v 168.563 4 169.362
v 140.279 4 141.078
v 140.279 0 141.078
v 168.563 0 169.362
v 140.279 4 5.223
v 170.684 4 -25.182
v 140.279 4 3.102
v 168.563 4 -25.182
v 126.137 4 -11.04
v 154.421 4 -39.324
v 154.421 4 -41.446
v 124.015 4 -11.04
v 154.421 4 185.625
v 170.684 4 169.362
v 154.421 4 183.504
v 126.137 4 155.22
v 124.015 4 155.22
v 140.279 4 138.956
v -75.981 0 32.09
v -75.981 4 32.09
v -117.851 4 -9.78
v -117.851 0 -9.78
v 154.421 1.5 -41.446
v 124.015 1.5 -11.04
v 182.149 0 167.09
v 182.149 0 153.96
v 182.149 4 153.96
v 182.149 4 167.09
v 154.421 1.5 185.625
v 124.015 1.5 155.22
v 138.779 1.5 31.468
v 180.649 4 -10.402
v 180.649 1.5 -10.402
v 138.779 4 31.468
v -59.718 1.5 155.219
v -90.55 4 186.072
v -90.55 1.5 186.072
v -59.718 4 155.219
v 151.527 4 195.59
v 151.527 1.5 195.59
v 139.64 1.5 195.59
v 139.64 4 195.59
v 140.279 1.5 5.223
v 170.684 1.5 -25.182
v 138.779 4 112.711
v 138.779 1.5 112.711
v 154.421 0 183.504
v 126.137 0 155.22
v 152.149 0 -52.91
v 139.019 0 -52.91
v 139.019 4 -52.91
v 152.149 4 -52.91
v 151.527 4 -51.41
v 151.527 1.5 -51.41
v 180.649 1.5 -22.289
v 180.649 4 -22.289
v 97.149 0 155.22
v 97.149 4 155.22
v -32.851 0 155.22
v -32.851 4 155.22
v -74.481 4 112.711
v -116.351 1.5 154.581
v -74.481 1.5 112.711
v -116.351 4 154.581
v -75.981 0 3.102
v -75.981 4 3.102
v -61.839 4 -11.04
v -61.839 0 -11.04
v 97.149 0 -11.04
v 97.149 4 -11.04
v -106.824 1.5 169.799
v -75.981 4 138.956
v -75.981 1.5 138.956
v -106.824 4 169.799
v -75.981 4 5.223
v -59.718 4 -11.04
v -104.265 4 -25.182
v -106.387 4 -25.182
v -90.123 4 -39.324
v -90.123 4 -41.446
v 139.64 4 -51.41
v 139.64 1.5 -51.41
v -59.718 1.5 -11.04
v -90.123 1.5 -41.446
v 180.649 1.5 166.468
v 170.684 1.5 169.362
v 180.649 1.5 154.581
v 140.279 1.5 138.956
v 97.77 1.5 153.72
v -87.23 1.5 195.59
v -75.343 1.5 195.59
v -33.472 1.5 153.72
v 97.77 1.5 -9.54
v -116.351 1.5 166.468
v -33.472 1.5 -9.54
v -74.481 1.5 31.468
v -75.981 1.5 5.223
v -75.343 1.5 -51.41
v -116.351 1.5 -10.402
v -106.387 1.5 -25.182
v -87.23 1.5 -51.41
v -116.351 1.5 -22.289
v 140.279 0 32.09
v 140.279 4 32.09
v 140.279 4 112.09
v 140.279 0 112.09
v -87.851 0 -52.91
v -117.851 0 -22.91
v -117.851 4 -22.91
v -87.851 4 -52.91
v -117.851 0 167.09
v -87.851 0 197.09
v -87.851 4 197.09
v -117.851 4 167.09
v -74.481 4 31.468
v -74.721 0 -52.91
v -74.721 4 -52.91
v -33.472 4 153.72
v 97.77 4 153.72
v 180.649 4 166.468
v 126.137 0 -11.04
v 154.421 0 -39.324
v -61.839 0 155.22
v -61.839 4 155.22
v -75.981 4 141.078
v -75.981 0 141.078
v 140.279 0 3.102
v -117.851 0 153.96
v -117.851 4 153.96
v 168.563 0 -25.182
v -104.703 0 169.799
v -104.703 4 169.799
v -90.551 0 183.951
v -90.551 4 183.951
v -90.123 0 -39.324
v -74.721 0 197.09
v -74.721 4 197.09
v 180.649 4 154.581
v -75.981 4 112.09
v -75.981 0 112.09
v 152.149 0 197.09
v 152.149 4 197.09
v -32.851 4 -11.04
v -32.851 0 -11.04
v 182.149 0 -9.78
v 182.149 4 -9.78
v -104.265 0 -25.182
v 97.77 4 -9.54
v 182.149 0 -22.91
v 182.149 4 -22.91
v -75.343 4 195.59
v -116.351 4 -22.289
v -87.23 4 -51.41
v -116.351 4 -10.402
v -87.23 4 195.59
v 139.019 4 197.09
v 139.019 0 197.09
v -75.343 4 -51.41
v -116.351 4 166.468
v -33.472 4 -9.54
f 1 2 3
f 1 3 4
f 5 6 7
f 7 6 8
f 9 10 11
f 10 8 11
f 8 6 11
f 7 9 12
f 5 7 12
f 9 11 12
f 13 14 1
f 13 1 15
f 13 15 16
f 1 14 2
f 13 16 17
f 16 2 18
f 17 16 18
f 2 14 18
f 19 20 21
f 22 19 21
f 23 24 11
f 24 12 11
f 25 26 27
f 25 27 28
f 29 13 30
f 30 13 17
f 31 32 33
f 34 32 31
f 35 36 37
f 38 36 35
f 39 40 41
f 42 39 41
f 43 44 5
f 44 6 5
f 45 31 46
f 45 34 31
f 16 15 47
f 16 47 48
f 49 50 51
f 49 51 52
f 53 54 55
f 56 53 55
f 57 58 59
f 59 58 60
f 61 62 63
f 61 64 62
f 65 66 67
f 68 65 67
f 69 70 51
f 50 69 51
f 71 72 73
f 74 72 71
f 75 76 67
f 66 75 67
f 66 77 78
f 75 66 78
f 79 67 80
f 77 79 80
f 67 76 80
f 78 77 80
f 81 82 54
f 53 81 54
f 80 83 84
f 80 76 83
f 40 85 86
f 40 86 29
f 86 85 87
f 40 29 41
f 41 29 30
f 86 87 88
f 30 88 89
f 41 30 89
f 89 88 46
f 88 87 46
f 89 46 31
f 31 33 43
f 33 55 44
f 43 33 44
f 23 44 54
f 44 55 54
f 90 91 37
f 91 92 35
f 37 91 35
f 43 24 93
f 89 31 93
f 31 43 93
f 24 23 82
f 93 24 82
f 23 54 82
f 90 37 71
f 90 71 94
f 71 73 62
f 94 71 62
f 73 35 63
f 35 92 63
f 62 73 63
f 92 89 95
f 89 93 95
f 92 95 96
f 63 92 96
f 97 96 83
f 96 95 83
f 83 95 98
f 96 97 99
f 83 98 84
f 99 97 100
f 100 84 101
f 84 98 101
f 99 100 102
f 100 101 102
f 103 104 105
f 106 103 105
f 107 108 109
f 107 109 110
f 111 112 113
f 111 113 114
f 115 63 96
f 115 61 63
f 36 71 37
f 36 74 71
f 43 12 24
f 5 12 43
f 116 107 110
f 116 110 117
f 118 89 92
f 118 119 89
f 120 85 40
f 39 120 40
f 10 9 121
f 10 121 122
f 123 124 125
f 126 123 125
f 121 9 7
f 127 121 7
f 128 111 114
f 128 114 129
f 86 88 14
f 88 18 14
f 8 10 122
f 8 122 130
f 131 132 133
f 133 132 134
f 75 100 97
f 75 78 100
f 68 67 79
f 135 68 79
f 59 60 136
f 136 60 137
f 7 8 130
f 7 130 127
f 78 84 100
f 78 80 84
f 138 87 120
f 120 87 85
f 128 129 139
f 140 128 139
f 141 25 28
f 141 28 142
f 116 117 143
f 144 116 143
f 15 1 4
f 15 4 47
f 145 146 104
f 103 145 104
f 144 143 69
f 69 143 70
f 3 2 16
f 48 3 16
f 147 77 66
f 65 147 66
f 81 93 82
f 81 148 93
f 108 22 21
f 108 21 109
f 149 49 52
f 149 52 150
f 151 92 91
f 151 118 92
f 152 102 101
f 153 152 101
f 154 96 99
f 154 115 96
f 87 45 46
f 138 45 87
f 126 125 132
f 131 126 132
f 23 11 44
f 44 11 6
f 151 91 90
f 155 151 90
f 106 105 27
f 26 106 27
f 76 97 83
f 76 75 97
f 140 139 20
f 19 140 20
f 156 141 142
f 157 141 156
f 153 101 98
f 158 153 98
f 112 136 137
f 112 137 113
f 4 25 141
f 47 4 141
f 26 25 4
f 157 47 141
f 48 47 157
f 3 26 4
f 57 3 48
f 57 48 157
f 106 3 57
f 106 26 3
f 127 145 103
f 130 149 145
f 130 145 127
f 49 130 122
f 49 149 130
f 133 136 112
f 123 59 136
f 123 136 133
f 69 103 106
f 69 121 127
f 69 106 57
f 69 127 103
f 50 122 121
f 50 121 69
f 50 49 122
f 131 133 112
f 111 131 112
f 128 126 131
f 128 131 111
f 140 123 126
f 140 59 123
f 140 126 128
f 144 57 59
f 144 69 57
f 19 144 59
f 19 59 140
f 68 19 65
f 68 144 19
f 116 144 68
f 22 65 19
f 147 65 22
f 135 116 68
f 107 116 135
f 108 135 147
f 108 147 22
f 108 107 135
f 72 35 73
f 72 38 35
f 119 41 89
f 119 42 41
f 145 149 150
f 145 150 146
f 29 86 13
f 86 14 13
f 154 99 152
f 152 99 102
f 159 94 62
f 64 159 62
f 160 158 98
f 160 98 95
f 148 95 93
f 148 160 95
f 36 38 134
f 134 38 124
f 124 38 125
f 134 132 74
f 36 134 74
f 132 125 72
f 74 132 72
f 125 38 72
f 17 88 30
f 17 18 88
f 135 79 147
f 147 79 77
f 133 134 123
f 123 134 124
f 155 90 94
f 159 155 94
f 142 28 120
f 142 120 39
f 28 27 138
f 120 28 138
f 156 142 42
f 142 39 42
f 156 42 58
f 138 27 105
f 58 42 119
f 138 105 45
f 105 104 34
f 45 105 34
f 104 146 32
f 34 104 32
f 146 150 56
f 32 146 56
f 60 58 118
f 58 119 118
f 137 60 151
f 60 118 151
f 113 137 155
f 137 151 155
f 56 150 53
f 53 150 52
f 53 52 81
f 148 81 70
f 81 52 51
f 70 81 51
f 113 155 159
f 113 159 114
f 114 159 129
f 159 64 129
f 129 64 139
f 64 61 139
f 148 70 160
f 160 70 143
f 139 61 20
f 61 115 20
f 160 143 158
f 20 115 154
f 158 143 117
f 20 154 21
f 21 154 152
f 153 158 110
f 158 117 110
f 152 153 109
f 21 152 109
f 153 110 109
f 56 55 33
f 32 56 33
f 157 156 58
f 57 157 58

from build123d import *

# Parameters (mm, degrees)
BOSS_EXTRUDE1_DEPTH = 4
CUT_EXTRUDE1_DEPTH  = 5
CUT_EXTRUDE3_DEPTH  = 5
CUT_EXTRUDE4_DEPTH  = 5
CUT_EXTRUDE5_DEPTH  = 5
SHELL1_T            = -1.5


with BuildPart() as part:
    # Sketch1 → Boss-Extrude1 (new body)
    with BuildSketch(Plane(origin=(0, 0, 0), x_dir=(1, 0, 0), z_dir=(0, 1, 0))):
        Polygon((-87.851196474, 52.910261526), (152.148803526, 52.910261526), (182.148803526, 22.910261526), (182.148803526, -167.089738474), (152.148803526, -197.089738474), (-87.851196474, -197.089738474), (-117.851196474, -167.089738474), (-117.851196474, 22.910261526), align=None)
    extrude(amount=BOSS_EXTRUDE1_DEPTH)

    # Sketch2 → Cut-Extrude1 (cut)
    with BuildSketch(Plane(origin=(0, 4, 0), x_dir=(1, 0, 0), z_dir=(0, 1, 0))):
        Polygon((-75.981138789, -72.089738474), (-75.981138789, -32.089738474), (-117.851196474, 9.780319211), (-117.851196474, -153.959796159), (-75.981138789, -112.089738474), align=None)
    extrude(amount=-CUT_EXTRUDE1_DEPTH, mode=Mode.SUBTRACT)

    # Sketch2<5> → Cut-Extrude3 (cut)
    with BuildSketch(Plane(origin=(0, 4, 0), x_dir=(1, 0, 0), z_dir=(0, 1, 0))):
        Polygon((140.278745841, -72.089738474), (140.278745841, -112.089738474), (182.148803526, -153.959796159), (182.148803526, 9.780319211), (140.278745841, -32.089738474), align=None)
    extrude(amount=-CUT_EXTRUDE3_DEPTH, mode=Mode.SUBTRACT)

    # Sketch2<6> → Cut-Extrude4 (cut)
    with BuildSketch(Plane(origin=(0, 4, 0), x_dir=(1, 0, 0), z_dir=(0, 1, 0))):
        Polygon((-61.839003165, -155.219680789), (-75.981138789, -141.077545165), (-104.702510795, -169.798917171), (-90.550656516, -183.95077145), align=None)
        Polygon((-75.981138789, -3.101931783), (-61.839003165, 11.040203841), (-90.123274413, 39.324475088), (-104.265410036, 25.182339465), align=None)
        Polygon((168.563017088, 25.182339465), (154.420881465, 39.324475088), (126.136610217, 11.040203841), (140.278745841, -3.101931783), align=None)
        Polygon((140.278745841, -141.077545165), (126.136610217, -155.219680789), (154.420881465, -183.503952036), (168.563017088, -169.361816413), align=None)
    extrude(amount=-CUT_EXTRUDE4_DEPTH, mode=Mode.SUBTRACT)

    # Sketch2<7> → Cut-Extrude5 (cut)
    with BuildSketch(Plane(origin=(0, 4, 0), x_dir=(1, 0, 0), z_dir=(0, 1, 0))):
        Polygon((139.018803526, 52.910261526), (-74.721196474, 52.910261526), (-32.851138789, 11.040203841), (97.148861211, 11.040203841), align=None)
        Polygon((-74.721196474, -197.089738474), (139.018803526, -197.089738474), (97.148861211, -155.219680789), (-32.851138789, -155.219680789), align=None)
    extrude(amount=-CUT_EXTRUDE5_DEPTH, mode=Mode.SUBTRACT)

    # Shell1
    shell1_openings = [part.faces().sort_by_distance(p)[0] for p in [
        (147.349813653, 4, 162.290748601),
    ]]
    offset(amount=SHELL1_T, openings=shell1_openings, kind=Kind.INTERSECTION)


solid = part.part
